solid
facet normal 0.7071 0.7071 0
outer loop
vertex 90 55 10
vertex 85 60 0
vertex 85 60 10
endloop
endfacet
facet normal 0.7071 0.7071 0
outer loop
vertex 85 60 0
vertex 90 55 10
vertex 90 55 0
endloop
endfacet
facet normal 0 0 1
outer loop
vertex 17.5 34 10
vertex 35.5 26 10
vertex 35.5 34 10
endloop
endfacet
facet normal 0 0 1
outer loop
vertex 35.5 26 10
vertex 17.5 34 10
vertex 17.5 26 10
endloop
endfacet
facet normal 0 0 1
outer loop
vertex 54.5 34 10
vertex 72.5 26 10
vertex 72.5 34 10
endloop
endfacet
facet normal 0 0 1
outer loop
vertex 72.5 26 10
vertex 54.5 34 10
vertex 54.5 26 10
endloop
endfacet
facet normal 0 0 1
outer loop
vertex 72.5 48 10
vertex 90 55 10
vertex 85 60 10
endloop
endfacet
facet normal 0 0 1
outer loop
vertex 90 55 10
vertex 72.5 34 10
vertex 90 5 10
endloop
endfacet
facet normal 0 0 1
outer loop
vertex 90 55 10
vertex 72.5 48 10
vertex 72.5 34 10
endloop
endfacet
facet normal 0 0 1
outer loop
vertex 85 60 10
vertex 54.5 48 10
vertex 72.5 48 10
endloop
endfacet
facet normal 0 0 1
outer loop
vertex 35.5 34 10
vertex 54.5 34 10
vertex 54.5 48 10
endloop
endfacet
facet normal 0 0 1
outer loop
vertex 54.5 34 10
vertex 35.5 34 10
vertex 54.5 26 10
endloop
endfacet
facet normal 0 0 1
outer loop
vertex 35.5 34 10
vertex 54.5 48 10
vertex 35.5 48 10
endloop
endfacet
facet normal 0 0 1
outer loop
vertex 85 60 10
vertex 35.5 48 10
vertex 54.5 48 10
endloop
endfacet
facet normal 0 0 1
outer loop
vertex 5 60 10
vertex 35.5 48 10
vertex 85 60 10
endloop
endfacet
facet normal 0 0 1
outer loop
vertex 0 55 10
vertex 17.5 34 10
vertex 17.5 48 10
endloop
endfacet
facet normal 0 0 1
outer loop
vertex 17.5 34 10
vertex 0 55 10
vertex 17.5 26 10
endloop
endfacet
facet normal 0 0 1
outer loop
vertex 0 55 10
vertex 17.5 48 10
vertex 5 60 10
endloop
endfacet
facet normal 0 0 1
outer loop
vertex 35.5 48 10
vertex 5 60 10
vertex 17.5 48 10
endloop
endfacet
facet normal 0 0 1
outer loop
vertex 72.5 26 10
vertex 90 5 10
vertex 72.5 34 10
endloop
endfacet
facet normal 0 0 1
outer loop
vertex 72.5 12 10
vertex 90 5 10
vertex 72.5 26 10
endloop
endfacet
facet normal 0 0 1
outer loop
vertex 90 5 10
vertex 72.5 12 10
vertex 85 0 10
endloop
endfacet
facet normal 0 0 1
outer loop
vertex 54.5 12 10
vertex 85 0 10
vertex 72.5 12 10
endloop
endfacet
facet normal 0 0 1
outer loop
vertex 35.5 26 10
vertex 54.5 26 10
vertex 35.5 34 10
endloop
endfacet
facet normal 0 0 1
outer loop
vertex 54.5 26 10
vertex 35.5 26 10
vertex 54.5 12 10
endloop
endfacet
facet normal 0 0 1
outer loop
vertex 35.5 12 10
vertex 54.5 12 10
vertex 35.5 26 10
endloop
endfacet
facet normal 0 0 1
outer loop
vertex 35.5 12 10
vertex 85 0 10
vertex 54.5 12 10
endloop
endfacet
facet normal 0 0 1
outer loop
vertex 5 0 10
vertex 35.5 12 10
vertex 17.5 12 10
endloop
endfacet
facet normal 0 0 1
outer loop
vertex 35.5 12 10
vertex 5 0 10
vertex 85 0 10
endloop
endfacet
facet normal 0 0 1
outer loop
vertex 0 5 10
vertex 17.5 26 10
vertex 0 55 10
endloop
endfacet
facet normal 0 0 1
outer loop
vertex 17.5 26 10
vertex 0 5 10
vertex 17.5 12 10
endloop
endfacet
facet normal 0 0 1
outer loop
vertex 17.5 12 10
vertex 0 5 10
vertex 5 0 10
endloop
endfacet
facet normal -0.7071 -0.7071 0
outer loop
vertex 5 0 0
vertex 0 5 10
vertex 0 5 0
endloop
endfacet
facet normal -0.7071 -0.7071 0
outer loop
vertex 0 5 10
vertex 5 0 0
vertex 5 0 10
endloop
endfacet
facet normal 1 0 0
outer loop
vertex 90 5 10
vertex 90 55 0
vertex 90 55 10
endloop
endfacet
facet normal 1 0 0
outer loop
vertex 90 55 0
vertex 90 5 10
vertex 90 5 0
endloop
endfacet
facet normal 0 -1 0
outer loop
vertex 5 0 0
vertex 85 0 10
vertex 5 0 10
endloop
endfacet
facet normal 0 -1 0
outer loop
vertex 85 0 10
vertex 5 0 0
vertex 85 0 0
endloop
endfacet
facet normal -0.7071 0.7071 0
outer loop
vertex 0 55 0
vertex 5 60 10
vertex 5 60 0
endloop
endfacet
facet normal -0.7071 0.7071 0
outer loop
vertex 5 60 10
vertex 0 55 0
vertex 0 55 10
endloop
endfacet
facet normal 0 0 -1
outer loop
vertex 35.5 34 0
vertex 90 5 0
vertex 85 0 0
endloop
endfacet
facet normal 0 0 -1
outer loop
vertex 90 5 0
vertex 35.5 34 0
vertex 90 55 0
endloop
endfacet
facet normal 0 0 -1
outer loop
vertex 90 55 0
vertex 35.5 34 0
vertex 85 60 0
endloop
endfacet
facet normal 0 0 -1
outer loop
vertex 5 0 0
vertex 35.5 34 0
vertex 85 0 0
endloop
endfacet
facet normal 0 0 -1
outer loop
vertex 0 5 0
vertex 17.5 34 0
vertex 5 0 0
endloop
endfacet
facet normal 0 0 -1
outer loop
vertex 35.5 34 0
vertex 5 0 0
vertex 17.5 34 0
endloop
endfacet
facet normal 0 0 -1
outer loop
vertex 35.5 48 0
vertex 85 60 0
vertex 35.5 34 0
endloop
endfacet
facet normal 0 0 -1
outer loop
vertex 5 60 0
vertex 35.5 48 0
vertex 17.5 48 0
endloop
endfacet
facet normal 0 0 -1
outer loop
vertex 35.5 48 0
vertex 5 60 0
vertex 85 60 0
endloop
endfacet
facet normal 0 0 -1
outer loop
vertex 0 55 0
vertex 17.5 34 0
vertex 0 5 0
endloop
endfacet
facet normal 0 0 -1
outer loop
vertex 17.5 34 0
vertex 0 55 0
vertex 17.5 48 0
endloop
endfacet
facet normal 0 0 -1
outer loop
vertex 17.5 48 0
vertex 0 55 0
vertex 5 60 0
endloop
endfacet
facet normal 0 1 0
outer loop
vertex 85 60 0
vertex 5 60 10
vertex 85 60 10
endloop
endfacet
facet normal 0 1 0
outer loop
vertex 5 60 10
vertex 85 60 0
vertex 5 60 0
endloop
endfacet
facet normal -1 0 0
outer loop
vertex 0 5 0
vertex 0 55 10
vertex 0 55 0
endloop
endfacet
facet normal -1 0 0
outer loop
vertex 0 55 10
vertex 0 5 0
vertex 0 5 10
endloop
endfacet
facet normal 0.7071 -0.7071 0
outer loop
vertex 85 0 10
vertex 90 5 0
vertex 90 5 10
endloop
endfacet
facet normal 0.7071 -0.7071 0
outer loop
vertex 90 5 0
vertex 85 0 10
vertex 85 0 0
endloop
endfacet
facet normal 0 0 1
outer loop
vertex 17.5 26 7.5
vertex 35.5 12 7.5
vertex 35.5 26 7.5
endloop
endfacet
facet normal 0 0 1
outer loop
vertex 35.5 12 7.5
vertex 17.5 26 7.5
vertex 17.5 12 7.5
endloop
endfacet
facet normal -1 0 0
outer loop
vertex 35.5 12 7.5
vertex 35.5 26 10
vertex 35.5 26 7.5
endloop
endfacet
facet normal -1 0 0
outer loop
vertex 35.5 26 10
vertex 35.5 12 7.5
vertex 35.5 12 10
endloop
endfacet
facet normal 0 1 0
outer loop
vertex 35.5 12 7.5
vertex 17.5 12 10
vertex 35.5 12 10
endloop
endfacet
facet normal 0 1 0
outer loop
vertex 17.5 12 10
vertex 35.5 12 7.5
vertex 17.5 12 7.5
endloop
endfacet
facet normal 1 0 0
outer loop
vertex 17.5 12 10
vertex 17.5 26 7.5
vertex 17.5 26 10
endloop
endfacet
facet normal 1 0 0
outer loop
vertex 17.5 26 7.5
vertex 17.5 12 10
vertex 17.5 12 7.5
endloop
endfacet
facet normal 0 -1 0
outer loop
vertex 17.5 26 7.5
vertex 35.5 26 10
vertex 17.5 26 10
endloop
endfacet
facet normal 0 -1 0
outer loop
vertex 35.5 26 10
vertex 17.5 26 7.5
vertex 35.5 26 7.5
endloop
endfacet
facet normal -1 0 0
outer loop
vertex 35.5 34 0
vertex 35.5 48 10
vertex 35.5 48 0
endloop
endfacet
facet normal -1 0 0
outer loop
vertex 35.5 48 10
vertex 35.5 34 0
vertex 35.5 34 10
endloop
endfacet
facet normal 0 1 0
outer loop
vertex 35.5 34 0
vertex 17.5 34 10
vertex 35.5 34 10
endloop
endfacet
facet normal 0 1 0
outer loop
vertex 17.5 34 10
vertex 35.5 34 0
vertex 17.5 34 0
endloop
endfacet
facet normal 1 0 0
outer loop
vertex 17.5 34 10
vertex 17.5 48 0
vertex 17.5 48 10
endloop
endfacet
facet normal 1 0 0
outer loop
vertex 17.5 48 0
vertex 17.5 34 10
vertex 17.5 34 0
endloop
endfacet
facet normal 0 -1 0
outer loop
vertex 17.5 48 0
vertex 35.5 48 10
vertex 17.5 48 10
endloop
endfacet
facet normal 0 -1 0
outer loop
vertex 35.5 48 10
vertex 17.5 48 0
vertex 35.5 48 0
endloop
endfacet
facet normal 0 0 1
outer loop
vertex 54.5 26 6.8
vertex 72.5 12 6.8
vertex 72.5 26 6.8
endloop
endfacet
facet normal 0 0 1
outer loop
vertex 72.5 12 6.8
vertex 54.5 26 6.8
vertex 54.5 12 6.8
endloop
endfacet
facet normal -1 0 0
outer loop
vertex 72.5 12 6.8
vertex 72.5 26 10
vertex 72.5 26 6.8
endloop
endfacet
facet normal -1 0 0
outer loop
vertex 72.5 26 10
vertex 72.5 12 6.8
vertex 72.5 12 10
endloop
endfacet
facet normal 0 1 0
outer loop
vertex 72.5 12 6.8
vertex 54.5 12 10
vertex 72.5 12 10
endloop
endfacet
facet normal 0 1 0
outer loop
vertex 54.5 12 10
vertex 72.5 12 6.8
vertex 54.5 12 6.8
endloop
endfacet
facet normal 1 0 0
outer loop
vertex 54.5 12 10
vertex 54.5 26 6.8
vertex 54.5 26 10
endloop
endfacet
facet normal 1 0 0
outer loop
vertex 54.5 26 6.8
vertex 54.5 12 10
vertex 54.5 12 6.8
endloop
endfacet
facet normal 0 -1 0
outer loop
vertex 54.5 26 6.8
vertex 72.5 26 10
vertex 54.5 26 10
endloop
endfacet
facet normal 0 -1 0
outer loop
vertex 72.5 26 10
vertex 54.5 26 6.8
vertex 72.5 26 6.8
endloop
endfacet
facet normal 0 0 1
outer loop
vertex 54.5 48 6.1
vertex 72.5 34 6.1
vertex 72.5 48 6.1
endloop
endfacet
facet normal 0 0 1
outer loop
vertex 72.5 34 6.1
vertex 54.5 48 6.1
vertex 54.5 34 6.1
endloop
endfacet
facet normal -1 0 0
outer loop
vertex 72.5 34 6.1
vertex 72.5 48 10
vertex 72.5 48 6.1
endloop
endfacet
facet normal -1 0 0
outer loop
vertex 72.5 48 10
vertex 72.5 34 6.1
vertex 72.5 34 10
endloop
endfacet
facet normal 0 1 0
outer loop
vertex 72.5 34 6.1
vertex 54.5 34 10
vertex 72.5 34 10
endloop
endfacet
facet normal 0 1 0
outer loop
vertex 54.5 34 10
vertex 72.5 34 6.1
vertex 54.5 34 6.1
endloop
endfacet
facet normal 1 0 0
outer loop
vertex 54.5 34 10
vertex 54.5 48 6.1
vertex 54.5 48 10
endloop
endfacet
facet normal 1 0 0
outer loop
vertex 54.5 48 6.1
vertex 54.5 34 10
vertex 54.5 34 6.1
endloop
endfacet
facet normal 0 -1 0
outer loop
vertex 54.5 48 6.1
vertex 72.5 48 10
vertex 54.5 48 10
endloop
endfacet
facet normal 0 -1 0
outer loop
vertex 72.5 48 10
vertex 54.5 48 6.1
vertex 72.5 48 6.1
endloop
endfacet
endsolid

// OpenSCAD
$fn = 32;

// ----------------------------------------------------------------------
// Windowed plate: 4 voids, 90 x 60 x 10 mm
// ----------------------------------------------------------------------

// --- parameters (mm) ---
plate_l = 90;             // plate length, X
plate_w = 60;             // plate width, Y
plate_t = 10;             // plate thickness, Z
edge_margin = 8;          // wall from the plate edge to any window
win_l = 18;               // pocket length
win_w = 14;               // pocket width
pitch_x = 37;             // grid pitch along X
pitch_y = 22;             // grid pitch along Y
depth_1 = 2.5;            // depth of void 1 (full thickness = through)
depth_2 = 10;             // depth of void 2 (full thickness = through)
depth_3 = 3.2;            // depth of void 3 (full thickness = through)
depth_4 = 3.9;            // depth of void 4 (full thickness = through)
corner_c = 5;             // corner chamfer of the plate

profile = [[5, 0], [85, 0], [90, 5], [90, 55], [85, 60], [5, 60], [0, 55], [0, 5]];  // primary outline, 8 points, counter clockwise
void_1 = [[17.5, 12], [35.5, 12], [35.5, 26], [17.5, 26]];  // pocket at grid node 0,0, 4 points
void_2 = [[17.5, 34], [35.5, 34], [35.5, 48], [17.5, 48]];  // pocket at grid node 0,1, 4 points
void_3 = [[54.5, 12], [72.5, 12], [72.5, 26], [54.5, 26]];  // pocket at grid node 1,0, 4 points
void_4 = [[54.5, 34], [72.5, 34], [72.5, 48], [54.5, 48]];  // pocket at grid node 1,1, 4 points

// --- the one profile operation ---
difference() {
  linear_extrude(height = plate_t) polygon(points = profile);
  translate([0, 0, plate_t - depth_1])
    linear_extrude(height = depth_1 + 1) polygon(points = void_1);
  translate([0, 0, -1])
    linear_extrude(height = plate_t + 2) polygon(points = void_2);
  translate([0, 0, plate_t - depth_3])
    linear_extrude(height = depth_3 + 1) polygon(points = void_3);
  translate([0, 0, plate_t - depth_4])
    linear_extrude(height = depth_4 + 1) polygon(points = void_4);
}
